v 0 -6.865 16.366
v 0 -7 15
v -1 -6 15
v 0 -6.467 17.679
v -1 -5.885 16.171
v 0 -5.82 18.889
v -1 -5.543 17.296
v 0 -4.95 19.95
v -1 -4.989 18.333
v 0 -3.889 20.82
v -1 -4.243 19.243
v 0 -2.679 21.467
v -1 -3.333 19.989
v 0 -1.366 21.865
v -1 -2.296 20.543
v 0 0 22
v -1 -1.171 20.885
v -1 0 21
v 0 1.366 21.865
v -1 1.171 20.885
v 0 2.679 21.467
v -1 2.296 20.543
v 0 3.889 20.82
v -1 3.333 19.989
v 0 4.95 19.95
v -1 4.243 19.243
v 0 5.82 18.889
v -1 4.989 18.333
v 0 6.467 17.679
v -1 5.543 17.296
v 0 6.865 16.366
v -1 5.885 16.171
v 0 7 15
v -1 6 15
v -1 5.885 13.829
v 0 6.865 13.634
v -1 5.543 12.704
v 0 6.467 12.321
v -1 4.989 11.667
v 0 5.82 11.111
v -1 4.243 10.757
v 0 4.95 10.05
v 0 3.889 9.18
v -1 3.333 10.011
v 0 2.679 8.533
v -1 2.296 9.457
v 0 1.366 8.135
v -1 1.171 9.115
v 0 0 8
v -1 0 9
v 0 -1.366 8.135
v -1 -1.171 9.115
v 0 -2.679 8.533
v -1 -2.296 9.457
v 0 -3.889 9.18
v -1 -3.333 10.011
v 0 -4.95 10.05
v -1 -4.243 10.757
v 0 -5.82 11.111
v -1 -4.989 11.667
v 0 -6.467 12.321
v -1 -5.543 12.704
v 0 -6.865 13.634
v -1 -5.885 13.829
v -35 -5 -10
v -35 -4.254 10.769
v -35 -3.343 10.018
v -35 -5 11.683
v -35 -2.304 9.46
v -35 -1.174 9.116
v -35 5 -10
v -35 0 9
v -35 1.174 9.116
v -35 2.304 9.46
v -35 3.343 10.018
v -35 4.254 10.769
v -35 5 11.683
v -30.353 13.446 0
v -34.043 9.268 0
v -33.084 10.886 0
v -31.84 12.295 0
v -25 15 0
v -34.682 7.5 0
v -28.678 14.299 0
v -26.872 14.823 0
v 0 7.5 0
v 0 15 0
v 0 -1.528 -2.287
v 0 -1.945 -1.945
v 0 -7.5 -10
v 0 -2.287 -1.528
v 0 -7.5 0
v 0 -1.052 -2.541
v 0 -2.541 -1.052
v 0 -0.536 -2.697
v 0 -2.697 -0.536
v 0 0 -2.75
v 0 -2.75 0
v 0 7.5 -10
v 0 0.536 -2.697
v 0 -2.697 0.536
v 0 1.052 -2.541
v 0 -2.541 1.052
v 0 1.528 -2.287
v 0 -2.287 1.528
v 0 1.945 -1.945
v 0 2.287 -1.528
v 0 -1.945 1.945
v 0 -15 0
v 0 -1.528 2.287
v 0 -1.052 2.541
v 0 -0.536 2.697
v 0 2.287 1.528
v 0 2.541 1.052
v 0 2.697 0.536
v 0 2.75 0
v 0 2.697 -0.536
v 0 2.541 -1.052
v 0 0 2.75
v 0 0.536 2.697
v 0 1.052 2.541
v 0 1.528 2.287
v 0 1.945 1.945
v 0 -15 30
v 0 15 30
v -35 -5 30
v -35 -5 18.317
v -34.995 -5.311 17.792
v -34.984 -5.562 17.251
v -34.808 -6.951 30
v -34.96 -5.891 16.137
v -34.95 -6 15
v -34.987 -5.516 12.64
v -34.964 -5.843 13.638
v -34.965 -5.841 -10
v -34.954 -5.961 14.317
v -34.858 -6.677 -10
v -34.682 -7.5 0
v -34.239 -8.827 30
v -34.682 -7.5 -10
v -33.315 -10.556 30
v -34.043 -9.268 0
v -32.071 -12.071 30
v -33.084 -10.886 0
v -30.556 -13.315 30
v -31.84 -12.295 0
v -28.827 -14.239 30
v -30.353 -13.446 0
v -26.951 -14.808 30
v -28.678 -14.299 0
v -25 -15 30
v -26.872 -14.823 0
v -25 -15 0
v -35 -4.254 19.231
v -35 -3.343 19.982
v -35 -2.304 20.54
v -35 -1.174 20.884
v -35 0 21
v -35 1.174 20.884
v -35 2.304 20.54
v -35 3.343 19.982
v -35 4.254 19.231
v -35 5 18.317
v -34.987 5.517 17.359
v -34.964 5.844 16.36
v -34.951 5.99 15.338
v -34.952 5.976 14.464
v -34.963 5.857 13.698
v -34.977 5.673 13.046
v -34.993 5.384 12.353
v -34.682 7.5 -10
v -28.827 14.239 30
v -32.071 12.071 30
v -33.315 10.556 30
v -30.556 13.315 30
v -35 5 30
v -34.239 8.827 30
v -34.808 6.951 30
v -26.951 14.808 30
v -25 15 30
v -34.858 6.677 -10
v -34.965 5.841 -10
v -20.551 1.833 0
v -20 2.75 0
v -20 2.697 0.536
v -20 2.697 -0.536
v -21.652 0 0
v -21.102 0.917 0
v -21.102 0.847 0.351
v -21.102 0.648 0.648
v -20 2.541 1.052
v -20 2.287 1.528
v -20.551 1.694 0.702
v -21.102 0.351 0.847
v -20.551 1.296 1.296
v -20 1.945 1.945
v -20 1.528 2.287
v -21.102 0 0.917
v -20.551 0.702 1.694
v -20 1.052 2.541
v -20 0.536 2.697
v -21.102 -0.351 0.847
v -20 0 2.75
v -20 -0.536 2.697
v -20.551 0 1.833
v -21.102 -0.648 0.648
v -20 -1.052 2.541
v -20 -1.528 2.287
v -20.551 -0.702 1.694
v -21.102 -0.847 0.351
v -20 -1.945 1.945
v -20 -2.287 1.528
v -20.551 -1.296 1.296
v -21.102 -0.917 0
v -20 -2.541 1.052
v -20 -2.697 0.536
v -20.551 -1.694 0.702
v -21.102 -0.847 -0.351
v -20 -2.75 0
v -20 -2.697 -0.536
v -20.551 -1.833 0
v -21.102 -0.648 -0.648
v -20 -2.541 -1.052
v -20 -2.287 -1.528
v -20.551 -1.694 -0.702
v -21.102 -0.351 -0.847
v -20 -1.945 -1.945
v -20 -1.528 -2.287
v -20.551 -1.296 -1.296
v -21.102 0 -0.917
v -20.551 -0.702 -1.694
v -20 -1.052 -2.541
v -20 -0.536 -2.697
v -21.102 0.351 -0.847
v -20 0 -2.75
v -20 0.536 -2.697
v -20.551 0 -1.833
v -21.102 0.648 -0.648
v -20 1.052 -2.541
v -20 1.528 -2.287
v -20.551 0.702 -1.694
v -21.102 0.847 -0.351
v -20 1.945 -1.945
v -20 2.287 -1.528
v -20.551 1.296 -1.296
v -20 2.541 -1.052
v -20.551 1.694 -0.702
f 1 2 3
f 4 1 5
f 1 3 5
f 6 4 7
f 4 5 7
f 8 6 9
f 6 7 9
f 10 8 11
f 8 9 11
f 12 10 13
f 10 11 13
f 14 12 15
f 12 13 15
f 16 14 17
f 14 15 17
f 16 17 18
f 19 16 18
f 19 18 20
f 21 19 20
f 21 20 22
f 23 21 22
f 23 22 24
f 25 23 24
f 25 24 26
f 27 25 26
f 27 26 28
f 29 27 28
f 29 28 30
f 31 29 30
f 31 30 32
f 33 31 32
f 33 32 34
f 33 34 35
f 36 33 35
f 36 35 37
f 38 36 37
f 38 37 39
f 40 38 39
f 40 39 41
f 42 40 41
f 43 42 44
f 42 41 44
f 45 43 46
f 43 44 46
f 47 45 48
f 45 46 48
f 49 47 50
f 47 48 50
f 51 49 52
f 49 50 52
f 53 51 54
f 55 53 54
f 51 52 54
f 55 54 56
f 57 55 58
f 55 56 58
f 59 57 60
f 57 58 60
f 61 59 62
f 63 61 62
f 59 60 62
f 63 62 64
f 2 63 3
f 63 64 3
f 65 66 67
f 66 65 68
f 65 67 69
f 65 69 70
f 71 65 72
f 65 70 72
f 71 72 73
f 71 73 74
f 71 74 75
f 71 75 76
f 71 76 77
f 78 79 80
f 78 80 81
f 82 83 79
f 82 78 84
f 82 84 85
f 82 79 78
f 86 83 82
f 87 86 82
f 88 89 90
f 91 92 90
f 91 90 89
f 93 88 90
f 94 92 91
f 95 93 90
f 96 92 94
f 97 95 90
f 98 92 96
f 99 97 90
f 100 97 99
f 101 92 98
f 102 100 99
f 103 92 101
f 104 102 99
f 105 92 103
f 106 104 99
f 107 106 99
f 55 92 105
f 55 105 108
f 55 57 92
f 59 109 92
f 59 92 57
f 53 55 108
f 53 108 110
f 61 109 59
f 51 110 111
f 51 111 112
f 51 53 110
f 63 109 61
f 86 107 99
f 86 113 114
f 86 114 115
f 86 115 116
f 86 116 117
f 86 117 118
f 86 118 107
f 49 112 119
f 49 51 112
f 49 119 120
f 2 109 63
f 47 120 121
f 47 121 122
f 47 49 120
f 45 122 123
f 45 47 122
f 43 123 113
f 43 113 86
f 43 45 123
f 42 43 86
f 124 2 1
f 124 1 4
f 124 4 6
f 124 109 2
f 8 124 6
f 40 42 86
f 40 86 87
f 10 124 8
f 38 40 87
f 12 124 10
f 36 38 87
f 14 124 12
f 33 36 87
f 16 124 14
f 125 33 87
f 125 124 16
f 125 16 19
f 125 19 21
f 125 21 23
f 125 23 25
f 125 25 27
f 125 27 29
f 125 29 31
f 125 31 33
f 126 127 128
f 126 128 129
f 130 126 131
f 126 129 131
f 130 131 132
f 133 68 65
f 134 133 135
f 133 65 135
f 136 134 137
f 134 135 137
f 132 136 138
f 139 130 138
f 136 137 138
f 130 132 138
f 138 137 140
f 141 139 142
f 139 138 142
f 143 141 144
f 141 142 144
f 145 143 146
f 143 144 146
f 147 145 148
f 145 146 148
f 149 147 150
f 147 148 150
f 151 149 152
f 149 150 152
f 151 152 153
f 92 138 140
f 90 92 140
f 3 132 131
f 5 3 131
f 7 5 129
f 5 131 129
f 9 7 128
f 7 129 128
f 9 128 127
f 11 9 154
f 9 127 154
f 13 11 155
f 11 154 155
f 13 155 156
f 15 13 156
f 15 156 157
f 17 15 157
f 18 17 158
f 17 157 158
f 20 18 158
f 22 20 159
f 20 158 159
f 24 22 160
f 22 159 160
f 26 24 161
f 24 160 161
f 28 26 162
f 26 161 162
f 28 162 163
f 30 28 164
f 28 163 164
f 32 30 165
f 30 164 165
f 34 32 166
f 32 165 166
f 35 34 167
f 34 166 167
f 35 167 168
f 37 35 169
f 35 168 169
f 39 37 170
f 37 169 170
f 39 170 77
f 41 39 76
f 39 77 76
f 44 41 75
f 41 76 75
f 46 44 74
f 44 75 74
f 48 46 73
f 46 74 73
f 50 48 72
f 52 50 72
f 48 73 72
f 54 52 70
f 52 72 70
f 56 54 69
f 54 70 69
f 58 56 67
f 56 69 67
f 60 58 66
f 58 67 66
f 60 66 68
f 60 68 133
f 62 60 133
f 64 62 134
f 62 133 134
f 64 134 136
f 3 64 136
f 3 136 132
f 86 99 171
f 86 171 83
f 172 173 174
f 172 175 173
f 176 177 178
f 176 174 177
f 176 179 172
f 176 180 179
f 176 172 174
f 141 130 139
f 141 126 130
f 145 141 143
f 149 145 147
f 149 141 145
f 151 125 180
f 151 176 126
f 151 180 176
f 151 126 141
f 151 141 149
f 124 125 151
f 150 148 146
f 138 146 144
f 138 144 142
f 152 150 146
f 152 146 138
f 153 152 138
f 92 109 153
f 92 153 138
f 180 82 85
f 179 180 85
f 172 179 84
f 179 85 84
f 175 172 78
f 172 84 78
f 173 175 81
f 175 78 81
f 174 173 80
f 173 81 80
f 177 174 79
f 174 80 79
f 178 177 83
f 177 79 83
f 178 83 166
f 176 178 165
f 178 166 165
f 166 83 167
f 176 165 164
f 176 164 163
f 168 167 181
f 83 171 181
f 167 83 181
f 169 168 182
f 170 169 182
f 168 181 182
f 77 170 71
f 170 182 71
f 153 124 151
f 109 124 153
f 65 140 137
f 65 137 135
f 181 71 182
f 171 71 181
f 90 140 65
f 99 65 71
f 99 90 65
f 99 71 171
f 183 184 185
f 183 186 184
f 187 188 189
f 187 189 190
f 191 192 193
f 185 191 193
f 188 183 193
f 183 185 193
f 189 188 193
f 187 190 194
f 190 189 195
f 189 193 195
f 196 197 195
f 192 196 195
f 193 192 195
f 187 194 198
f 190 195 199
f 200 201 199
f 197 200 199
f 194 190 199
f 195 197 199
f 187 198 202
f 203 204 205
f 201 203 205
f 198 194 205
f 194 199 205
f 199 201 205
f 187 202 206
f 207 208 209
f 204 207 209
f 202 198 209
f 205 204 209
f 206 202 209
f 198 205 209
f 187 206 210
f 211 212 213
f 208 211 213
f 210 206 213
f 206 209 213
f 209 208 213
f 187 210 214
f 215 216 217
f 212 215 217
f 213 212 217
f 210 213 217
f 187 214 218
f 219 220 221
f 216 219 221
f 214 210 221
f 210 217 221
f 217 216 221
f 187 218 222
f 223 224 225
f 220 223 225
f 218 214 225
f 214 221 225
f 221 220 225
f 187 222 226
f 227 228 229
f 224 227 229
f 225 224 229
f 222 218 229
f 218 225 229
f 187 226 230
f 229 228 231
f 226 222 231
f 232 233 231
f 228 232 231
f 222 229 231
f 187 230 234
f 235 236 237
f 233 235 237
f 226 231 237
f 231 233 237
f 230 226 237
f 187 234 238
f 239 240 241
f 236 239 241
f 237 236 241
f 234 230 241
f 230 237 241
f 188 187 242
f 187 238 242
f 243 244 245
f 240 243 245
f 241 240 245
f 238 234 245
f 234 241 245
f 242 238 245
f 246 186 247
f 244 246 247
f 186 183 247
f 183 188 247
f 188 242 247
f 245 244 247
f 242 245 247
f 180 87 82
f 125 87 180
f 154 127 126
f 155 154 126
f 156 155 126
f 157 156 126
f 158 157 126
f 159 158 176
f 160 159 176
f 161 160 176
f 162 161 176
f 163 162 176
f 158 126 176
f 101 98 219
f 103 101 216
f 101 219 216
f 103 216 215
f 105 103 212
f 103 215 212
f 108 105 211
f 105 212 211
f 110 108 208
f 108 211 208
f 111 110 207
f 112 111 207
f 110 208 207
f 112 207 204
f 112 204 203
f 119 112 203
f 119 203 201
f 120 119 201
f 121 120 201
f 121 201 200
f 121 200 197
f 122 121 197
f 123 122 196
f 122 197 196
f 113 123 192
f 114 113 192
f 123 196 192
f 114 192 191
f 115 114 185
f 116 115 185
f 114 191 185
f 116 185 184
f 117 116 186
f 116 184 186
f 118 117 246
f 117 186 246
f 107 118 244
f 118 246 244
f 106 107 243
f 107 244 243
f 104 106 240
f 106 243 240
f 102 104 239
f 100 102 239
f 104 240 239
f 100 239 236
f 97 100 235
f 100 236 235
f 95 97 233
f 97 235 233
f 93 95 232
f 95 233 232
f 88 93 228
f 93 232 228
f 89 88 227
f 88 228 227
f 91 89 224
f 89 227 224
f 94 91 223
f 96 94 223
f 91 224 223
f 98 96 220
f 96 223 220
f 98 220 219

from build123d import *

# Parameters (mm, degrees)
F1_DEPTH       = 35
F3_D           = 12
F3_CSINK_D     = 14
F3_CSINK_ANGLE = 90
F4_T1_DEPTH    = 80
F5_D           = 5.5
F5_DEPTH       = 20
F5_TIP         = 1.6523667023


# Not quite as in the source:
# - a fillet or chamfer that OpenCascade refuses, or shapes differently, is made with other operations: its cross-section is extruded or revolved along the edge and cut away or added


with BuildPart() as f1:
    # F0 (on Right) → F1 (new body)
    with BuildSketch(Plane.YZ):
        Polygon((15, 30), (0, 30), (-15, 30), (-15, 0), (-7.5, 0), (-7.5, -10), (0, -10), (7.5, -10), (7.5, 0), (15, 0), align=None)
    extrude(amount=-F1_DEPTH)

    # F3 (through all)
    with Locations(Plane.YZ):
        with Locations((0, 15)):
            CounterSinkHole(F3_D / 2, F3_CSINK_D / 2, counter_sink_angle=F3_CSINK_ANGLE)

    # F4: fillet of radius 10 on 2 edges, made by hand

    # F4_s2 → F4_t1 (cut)
    with BuildSketch(Plane.XY.offset(-25)):
        with BuildLine():
            ThreePointArc((-25, 15), (-32.0710678119, 12.0710678119), (-35, 5))
            Line((-35, 5), (-35, 15))
            Line((-35, 15), (-25, 15))
        make_face()
        with BuildLine():
            ThreePointArc((-35, -5), (-32.0710678119, -12.0710678119), (-25, -15))
            Line((-25, -15), (-35, -15))
            Line((-35, -15), (-35, -5))
        make_face()
    extrude(amount=F4_T1_DEPTH, mode=Mode.SUBTRACT)

    # F5
    with Locations(Plane.YZ):
        with Locations((0, 0)):
            Hole(F5_D / 2, depth=F5_DEPTH)
            with Locations((0, 0, -(F5_DEPTH + F5_TIP / 2))):  # 118° drill point
                Cone(0, F5_D / 2, F5_TIP, mode=Mode.SUBTRACT)


solid = f1.part
